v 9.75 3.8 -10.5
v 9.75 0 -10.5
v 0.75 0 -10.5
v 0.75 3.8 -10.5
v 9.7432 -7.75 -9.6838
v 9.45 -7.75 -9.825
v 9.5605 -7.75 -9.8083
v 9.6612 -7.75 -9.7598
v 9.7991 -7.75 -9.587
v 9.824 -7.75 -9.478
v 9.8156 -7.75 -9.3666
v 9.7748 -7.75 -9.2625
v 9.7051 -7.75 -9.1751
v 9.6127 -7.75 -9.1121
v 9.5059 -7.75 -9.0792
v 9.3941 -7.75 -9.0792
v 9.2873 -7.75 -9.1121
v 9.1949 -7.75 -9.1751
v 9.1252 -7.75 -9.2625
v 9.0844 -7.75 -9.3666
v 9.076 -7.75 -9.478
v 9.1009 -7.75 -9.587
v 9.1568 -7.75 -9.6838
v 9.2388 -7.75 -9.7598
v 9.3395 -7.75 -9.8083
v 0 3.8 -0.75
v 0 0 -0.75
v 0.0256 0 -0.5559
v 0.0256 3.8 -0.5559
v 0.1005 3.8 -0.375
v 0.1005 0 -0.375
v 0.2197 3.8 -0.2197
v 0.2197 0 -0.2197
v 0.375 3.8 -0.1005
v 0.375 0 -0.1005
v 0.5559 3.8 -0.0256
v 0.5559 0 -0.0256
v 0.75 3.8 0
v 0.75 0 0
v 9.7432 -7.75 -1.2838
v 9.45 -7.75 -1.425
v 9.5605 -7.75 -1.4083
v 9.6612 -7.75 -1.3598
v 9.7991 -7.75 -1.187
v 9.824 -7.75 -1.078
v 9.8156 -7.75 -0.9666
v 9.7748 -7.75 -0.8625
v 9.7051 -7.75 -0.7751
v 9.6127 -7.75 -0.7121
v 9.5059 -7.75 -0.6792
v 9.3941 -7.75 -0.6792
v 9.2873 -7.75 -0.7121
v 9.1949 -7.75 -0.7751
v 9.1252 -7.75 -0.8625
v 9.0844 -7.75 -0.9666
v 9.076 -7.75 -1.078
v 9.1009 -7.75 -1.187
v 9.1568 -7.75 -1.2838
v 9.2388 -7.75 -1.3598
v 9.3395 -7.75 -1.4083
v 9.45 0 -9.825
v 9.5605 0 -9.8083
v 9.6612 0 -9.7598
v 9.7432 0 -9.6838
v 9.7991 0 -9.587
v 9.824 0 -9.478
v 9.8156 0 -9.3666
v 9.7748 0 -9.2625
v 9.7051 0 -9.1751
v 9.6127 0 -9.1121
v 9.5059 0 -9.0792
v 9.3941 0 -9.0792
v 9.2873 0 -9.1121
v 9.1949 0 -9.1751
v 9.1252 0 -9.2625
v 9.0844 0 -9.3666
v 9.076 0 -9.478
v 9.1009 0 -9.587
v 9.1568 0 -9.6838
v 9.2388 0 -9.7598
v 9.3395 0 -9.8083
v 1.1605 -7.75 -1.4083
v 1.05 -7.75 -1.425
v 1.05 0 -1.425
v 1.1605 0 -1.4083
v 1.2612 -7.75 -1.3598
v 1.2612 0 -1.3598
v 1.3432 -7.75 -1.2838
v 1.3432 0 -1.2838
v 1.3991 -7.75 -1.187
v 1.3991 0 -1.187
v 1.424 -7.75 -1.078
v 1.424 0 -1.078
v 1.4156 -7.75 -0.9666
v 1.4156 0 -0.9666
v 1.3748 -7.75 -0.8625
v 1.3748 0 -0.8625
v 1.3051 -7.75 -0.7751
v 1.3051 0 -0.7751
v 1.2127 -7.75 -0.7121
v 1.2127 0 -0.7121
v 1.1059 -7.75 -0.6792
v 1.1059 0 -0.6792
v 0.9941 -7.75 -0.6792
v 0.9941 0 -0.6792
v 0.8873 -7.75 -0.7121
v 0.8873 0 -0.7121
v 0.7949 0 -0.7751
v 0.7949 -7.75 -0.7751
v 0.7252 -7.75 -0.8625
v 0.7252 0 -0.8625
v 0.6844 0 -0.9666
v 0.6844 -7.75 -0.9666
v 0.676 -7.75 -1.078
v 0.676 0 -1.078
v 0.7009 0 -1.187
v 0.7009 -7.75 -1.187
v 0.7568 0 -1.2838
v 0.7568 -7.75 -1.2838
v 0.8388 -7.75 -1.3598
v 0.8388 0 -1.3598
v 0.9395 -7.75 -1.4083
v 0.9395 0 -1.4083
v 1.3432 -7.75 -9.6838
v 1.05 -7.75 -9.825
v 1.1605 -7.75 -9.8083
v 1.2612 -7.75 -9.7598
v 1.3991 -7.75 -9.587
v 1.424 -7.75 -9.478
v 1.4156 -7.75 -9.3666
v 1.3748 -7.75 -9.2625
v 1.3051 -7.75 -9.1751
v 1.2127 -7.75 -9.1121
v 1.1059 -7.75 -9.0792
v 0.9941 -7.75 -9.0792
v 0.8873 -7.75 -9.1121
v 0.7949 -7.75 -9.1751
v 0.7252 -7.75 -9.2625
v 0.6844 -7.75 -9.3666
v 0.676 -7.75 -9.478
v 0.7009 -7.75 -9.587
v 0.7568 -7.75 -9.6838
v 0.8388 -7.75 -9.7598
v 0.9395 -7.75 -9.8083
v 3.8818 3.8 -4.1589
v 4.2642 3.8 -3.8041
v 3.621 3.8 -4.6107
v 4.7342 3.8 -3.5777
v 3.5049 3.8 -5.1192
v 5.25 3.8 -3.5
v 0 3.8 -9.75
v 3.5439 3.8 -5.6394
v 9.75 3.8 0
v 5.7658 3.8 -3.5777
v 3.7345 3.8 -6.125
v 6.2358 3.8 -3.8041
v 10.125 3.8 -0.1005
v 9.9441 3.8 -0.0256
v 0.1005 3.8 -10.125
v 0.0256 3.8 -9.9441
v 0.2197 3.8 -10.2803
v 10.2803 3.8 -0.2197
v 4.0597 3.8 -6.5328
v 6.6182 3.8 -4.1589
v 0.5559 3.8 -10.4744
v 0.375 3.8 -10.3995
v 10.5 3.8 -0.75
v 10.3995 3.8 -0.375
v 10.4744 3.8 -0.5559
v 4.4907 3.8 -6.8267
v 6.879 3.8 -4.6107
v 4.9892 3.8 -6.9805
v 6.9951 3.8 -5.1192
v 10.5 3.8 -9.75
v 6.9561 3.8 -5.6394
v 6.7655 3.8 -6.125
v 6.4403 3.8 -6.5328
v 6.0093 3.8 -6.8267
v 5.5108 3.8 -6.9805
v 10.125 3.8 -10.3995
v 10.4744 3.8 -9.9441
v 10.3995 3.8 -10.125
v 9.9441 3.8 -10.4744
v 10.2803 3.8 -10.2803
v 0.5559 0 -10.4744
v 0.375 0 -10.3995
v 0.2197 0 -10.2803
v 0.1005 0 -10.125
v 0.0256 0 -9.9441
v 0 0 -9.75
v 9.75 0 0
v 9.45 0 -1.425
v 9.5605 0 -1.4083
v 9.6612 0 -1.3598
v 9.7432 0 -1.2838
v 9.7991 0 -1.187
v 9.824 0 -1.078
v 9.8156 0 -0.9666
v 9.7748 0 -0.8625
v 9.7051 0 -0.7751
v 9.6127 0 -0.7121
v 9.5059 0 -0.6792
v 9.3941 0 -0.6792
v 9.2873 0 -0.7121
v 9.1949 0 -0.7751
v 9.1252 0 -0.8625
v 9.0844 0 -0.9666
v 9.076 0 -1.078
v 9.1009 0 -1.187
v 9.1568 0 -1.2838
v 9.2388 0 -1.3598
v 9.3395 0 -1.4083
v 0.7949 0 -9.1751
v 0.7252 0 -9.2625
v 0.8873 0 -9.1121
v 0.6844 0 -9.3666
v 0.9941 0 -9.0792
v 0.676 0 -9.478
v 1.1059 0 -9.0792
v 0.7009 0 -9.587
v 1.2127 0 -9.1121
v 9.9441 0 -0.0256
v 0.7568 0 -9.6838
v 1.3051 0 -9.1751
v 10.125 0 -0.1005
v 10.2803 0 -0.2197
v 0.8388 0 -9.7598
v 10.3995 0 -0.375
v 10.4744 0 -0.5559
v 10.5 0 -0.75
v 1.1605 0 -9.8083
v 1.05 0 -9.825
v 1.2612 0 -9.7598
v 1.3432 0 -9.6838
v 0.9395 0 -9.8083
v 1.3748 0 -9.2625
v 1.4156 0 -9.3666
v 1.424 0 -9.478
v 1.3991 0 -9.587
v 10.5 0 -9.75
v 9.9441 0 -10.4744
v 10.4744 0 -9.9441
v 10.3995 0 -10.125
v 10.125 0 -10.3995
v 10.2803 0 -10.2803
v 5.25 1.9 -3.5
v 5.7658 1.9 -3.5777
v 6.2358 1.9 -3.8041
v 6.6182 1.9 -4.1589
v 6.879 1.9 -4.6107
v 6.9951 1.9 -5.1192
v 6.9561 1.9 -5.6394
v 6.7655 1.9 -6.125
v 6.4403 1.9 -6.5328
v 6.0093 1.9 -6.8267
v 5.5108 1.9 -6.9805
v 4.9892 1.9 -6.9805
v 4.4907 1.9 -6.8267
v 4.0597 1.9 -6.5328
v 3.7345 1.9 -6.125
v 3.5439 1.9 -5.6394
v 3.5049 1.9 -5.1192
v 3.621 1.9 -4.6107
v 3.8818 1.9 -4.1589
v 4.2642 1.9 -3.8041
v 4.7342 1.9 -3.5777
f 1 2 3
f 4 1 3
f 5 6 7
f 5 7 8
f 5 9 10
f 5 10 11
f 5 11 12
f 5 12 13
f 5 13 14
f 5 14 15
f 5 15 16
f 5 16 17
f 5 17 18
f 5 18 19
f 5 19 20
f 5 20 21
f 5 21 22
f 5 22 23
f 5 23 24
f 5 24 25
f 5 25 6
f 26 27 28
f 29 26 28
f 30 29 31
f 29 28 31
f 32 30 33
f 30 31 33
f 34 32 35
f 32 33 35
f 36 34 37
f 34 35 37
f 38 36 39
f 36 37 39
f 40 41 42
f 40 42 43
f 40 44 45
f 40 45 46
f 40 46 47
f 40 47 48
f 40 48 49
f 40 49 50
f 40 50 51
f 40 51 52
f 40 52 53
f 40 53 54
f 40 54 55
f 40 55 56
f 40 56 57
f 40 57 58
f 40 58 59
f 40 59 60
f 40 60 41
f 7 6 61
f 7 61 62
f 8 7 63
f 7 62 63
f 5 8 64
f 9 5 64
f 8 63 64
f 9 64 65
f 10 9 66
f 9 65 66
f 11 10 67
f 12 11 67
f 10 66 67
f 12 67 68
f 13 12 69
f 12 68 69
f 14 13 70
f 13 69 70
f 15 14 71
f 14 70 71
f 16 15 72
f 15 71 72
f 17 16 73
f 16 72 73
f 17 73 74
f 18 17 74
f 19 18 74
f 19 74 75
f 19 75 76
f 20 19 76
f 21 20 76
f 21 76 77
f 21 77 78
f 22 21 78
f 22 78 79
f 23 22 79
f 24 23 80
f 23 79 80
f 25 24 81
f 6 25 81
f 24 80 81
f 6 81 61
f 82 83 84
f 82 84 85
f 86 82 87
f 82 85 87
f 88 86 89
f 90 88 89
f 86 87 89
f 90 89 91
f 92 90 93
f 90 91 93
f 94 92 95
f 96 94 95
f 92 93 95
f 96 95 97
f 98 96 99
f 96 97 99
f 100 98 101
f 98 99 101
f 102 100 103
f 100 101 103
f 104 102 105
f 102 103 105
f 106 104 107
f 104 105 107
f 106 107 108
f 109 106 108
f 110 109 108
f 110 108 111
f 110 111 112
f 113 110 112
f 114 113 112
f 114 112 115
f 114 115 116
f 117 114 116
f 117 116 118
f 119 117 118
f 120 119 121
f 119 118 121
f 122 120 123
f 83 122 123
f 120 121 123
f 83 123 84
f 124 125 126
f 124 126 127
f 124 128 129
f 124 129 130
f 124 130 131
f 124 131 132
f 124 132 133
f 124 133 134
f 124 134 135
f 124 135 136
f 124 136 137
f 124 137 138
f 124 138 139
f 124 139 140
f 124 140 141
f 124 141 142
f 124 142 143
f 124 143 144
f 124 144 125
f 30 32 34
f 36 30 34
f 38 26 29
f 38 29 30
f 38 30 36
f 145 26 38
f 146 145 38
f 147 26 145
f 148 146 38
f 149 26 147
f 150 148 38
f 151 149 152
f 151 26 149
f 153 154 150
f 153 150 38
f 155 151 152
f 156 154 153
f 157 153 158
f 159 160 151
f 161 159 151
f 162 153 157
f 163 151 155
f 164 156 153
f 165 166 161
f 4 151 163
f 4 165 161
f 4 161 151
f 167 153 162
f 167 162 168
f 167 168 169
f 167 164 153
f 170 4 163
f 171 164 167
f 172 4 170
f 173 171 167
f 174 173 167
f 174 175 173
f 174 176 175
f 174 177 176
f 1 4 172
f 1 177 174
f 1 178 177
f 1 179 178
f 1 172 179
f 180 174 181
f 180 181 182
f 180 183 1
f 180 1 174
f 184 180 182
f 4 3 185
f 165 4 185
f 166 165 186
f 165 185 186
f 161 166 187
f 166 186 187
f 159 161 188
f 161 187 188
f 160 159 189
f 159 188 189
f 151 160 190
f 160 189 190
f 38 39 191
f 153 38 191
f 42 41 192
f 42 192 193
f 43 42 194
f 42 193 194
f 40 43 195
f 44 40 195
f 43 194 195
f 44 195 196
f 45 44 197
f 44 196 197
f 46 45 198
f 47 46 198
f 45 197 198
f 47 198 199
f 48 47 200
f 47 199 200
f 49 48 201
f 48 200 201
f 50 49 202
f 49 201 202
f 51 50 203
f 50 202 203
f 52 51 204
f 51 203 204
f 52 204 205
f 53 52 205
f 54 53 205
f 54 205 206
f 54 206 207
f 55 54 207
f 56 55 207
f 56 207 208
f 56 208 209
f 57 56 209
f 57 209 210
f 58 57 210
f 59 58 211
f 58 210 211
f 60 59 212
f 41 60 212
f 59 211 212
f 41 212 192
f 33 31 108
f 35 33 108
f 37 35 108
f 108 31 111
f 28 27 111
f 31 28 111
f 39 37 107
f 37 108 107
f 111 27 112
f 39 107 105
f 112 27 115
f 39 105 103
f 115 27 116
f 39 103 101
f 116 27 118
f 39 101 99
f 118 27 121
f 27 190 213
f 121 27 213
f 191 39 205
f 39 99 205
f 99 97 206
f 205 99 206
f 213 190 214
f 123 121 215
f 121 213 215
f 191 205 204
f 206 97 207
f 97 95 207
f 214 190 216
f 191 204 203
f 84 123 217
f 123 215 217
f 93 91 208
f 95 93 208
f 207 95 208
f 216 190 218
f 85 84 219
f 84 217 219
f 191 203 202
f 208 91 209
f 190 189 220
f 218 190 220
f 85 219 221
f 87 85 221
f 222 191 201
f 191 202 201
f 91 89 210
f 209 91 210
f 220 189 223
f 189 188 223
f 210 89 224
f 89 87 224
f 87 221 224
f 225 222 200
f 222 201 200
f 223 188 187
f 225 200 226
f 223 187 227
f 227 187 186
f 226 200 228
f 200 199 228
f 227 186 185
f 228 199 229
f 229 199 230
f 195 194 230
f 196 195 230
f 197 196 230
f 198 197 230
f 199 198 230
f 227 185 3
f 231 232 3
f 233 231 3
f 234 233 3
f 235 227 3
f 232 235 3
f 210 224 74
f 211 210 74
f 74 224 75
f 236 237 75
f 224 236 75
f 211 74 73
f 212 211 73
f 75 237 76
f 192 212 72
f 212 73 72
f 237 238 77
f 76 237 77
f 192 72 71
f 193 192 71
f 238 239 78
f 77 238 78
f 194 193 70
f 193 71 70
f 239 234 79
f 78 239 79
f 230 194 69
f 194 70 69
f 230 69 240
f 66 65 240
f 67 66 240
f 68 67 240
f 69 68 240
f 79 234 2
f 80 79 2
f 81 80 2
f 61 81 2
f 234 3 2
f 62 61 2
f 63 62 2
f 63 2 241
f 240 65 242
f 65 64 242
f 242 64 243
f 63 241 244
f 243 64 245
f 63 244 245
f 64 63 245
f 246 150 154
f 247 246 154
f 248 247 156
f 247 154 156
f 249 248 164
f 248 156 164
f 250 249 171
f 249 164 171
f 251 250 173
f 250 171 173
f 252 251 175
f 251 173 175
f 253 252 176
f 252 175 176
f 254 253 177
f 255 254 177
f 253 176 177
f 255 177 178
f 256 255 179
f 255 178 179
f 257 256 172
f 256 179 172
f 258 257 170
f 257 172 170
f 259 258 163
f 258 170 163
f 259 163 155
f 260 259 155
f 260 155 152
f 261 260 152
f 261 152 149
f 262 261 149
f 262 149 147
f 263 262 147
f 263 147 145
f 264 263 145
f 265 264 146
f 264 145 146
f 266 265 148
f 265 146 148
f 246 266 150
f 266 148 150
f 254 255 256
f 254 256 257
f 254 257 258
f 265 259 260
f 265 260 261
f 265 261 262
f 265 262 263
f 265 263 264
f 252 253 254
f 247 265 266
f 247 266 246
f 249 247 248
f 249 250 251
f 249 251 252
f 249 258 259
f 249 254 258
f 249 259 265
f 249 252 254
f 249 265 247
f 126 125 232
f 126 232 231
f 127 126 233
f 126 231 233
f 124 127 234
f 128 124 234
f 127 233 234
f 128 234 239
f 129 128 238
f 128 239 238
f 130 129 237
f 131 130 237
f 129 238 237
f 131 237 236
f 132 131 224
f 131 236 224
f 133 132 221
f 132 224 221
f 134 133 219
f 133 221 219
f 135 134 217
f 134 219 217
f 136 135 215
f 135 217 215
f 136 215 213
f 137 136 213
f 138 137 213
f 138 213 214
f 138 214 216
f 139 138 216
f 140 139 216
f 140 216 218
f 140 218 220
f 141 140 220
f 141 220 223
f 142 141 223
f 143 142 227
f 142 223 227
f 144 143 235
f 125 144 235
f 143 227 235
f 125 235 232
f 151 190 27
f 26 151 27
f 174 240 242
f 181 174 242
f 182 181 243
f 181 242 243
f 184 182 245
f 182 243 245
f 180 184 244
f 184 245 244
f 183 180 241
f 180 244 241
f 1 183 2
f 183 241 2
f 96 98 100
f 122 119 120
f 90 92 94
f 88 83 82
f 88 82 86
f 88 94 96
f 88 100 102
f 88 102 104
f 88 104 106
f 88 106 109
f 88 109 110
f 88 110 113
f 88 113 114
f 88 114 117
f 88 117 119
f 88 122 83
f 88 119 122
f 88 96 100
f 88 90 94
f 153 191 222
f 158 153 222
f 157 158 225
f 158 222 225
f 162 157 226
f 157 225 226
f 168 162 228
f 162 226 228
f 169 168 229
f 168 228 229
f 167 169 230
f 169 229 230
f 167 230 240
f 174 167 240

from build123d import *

# Parameters (mm, degrees)
BOSS_EXTRUDE1_DEPTH = 3.8
SKETCH2_2_R         = 1.75
CUT_EXTRUDE1_DEPTH  = 1.9
SKETCH3_R           = 0.375
BOSS_EXTRUDE3_DEPTH = 7.75


with BuildPart() as part:
    # Sketch1 → Boss-Extrude1 (new body)
    with BuildSketch(Plane(origin=(0, 0, 0), x_dir=(1, 0, 0), z_dir=(0, 1, 0))):
        with BuildLine():
            Line((0.75, 0), (9.75, 0))
            ThreePointArc((9.75, 0), (10.280330086, 0.219669914), (10.5, 0.75))
            Line((10.5, 0.75), (10.5, 9.75))
            ThreePointArc((10.5, 9.75), (10.280330086, 10.280330086), (9.75, 10.5))
            Line((9.75, 10.5), (0.75, 10.5))
            ThreePointArc((0.75, 10.5), (0.219669914, 10.280330086), (0, 9.75))
            Line((0, 9.75), (0, 0.75))
            ThreePointArc((0, 0.75), (0.219669914, 0.219669914), (0.75, 0))
        make_face()
    extrude(amount=BOSS_EXTRUDE1_DEPTH)

    # Sketch2<2> → Cut-Extrude1 (cut)
    with BuildSketch(Plane(origin=(0, 3.8, 0), x_dir=(1, 0, 0), z_dir=(0, 1, 0))):
        with Locations((5.25, 5.25)):
            Circle(SKETCH2_2_R)
    extrude(amount=-CUT_EXTRUDE1_DEPTH, mode=Mode.SUBTRACT)

    # Sketch3 → Boss-Extrude3 (add)
    with BuildSketch(Plane.XZ):
        with Locations((9.45, -1.05)):
            Circle(SKETCH3_R)
        with Locations((9.45, -9.45)):
            Circle(SKETCH3_R)
        with Locations((1.05, -9.45)):
            Circle(SKETCH3_R)
        with Locations((1.05, -1.05)):
            Circle(SKETCH3_R)
    extrude(amount=BOSS_EXTRUDE3_DEPTH)


solid = part.part
